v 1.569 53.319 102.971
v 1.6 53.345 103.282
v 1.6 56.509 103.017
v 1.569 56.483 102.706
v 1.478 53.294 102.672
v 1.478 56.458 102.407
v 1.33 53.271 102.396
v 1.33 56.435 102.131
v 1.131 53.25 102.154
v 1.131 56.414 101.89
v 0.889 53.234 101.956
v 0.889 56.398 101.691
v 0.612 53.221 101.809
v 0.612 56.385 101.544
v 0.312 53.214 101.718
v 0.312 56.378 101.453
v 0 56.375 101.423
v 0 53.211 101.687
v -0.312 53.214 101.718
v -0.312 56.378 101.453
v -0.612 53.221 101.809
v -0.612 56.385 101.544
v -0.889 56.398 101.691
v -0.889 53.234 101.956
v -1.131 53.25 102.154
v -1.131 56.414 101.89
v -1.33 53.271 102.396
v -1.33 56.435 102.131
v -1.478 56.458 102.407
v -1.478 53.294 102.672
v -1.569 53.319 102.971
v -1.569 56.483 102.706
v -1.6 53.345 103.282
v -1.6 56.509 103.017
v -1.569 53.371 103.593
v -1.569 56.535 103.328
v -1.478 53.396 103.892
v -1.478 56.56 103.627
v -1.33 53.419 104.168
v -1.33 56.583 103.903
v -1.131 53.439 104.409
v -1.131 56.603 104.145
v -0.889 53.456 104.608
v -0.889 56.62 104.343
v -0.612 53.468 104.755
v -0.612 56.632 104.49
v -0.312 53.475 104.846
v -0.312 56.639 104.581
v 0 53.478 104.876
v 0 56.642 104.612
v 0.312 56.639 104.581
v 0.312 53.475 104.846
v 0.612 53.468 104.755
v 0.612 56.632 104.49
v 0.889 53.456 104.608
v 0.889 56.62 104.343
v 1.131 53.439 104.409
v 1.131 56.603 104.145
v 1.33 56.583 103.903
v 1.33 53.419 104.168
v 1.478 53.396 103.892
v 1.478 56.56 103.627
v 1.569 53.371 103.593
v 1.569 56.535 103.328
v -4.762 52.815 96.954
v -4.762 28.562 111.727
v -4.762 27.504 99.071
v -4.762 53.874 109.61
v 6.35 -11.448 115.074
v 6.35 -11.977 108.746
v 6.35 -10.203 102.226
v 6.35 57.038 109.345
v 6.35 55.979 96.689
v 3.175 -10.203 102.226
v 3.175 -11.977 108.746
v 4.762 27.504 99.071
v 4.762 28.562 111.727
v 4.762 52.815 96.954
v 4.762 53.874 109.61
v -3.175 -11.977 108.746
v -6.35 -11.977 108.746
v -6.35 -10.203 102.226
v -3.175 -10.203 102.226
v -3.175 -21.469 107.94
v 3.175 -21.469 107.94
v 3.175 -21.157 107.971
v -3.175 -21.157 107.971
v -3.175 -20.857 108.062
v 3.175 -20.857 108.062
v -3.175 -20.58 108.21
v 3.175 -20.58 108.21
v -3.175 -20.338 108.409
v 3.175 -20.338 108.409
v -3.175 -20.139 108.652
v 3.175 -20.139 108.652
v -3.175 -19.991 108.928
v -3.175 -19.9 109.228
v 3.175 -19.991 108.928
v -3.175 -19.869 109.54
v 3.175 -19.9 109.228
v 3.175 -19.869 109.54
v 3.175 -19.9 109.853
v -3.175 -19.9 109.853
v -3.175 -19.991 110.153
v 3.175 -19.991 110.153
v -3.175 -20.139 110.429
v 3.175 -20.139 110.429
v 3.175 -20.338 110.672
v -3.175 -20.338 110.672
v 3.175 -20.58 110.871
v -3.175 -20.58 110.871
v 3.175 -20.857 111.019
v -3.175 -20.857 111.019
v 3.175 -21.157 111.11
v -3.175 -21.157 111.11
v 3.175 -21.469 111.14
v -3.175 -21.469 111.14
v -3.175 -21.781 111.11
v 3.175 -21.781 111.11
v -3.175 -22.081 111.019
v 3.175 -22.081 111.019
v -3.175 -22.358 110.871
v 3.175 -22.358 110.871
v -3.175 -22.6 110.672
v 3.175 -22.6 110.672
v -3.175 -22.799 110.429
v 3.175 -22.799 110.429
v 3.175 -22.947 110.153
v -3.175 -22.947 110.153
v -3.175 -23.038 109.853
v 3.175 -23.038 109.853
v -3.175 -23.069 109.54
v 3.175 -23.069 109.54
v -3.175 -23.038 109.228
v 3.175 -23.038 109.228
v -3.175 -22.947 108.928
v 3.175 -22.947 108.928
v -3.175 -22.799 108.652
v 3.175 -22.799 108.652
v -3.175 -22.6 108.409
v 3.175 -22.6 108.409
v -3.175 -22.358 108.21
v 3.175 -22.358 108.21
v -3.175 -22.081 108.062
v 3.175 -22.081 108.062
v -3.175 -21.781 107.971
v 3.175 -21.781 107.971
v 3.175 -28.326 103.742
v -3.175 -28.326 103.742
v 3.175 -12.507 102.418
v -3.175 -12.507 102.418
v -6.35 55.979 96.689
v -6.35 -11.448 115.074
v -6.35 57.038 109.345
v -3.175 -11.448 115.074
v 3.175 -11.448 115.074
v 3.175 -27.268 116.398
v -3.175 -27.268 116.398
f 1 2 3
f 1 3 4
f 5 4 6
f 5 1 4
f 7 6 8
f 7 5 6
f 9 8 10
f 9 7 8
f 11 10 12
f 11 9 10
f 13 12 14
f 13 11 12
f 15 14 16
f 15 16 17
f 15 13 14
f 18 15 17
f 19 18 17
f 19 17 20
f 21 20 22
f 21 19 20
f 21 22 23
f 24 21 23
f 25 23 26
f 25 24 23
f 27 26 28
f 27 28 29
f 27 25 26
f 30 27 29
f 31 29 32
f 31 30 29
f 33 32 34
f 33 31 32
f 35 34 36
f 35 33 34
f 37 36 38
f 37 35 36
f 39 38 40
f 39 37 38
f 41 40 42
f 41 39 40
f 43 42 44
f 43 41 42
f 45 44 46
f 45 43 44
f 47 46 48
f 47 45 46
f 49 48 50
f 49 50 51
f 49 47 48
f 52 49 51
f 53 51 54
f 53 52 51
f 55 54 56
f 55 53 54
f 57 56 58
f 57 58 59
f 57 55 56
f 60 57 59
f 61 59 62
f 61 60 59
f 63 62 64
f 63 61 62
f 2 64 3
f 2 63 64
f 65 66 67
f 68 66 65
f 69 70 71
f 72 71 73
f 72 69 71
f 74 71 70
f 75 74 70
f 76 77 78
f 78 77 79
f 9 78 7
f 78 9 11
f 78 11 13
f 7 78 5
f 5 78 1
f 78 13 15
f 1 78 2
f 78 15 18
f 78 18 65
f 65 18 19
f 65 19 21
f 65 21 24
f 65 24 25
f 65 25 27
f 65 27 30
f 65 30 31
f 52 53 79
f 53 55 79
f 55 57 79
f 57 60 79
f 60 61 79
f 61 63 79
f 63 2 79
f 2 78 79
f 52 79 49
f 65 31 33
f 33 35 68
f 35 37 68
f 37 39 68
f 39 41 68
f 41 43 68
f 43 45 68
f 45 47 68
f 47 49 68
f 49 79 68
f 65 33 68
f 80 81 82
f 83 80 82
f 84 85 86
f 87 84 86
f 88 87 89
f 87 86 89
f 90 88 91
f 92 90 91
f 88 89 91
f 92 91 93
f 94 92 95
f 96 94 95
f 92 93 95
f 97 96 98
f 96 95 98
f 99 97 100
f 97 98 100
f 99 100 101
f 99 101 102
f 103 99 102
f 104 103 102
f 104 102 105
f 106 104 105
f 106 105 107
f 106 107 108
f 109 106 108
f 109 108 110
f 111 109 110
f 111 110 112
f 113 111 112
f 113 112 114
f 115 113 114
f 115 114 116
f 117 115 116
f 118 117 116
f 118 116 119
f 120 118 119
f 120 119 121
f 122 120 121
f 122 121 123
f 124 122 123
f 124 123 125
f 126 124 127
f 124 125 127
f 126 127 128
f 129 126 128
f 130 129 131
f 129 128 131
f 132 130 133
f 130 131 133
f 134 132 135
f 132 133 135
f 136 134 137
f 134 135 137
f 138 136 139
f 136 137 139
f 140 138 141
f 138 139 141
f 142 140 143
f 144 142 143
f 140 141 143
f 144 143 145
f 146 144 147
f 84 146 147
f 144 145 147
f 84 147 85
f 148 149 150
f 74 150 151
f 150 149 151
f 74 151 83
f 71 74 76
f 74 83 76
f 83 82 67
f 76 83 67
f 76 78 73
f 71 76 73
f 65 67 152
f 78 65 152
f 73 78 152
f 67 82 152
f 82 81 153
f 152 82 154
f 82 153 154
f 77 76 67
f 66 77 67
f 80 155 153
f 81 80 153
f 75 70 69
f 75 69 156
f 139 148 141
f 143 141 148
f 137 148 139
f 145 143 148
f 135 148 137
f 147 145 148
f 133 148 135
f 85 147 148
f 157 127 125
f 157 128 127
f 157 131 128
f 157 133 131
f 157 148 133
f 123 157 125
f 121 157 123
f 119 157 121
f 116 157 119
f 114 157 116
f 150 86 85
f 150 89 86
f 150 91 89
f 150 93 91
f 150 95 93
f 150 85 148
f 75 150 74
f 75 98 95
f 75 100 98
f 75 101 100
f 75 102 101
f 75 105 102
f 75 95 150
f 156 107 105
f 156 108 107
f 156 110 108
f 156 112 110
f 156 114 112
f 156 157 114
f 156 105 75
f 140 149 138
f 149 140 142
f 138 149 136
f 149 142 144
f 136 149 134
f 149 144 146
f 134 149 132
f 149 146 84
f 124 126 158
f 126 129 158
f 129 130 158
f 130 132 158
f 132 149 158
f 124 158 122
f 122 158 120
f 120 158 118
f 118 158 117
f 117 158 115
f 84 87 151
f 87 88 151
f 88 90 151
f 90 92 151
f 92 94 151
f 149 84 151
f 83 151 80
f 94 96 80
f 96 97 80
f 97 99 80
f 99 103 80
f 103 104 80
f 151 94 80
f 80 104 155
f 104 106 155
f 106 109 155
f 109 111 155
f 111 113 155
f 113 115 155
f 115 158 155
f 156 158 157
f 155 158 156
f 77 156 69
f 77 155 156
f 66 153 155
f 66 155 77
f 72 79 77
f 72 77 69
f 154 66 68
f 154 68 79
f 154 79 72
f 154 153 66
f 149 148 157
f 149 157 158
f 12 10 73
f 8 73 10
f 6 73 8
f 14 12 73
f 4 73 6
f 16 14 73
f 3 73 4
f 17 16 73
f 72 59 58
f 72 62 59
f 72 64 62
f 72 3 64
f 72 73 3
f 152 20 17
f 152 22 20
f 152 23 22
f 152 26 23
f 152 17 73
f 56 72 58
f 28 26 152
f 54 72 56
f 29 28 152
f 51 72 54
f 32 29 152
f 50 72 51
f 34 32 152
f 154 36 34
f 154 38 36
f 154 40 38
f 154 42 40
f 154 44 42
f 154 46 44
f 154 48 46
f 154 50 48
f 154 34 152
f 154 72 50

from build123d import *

# Parameters (mm, degrees)
BOSS_EXTRUDE7_START                  = 3.81
SKETCH31_W                           = 68.725
SKETCH31_H                           = 12.7
SKETCH31_W_2                         = 25.4
SKETCH31_H_2                         = 9.525
SKETCH31_W_3                         = 15.875
SKETCH31_H_3                         = 6.35
BOSS_EXTRUDE7_DEPTH                  = 12.7
M3_CLEARANCE_HOLE4_D                 = 3.2
CUT_EXTRUDE3_START                   = 6.35
CUT_EXTRUDE3_DEPTH                   = 3.175
CUT_EXTRUDE4_START                   = -6.35
CUT_EXTRUDE4_DEPTH                   = 3.175
BALL_START                           = 44.54897704
BALL_BALANCER_MASTER_MODEL_OUTLINE_R = 1.6
BALL_BALANCER_MASTER_MODEL_DEPTH     = 3.175


# Read off the part's stored shape, not the designer's step: Ball Balancer Master Model
with BuildPart() as part:
    # Sketch31 → Boss-Extrude7 (new body)
    # profile 1 of 2: a face of its own
    with BuildSketch(Plane(origin=(0, 9.162503731, 109.526818173), x_dir=(0, 0.9965191508346533, -0.08336415308621317), z_dir=(0, 0.08336415308621317, 0.9965191508346533)).offset(BOSS_EXTRUDE7_START)):
        with Locations((13.36147704, 0)):
            Rectangle(SKETCH31_W, SKETCH31_H)
        with Locations((31.84897704, 0)):
            Rectangle(SKETCH31_W_2, SKETCH31_H_2, mode=Mode.SUBTRACT)
    # profile 2 of 2: a face of its own
    with BuildSketch(Plane(origin=(0, 9.162503731, 109.526818173), x_dir=(0, 0.9965191508346533, -0.08336415308621317), z_dir=(0, 0.08336415308621317, 0.9965191508346533)).offset(BOSS_EXTRUDE7_START)):
        with Locations((-28.93852296, 0)):
            Rectangle(SKETCH31_W_3, SKETCH31_H_3)
    extrude(amount=-BOSS_EXTRUDE7_DEPTH)

    # M3 Clearance Hole4 (through all)
    with Locations(Plane.ZY.offset(3.175)):
        with Locations((-85.094578454, 48.544265488), (109.540435581, -21.469007696)):
            Hole(M3_CLEARANCE_HOLE4_D / 2)

    # Sketch35 → Cut-Extrude3 (cut)
    with BuildSketch(Plane.ZY.offset(CUT_EXTRUDE3_START)):
        Polygon((108.746392023, -11.977162785), (102.225823269, -10.203359146), (102.418495416, -12.506525157), align=None)
    extrude(amount=-CUT_EXTRUDE3_DEPTH, mode=Mode.SUBTRACT)

    # Sketch36 → Cut-Extrude4 (cut)
    with BuildSketch(Plane.ZY.offset(CUT_EXTRUDE4_START)):
        Polygon((102.225823269, -10.203359146), (108.746392023, -11.977162785), (102.418495416, -12.506525157), align=None)
    extrude(amount=CUT_EXTRUDE4_DEPTH, mode=Mode.SUBTRACT)

    # Ball Balancer Master Model outline → Ball Balancer Master Model (cut)
    with BuildSketch(Plane(origin=(0, 0, 0), x_dir=(1, 0, 0), z_dir=(0, 0.9965191508346533, -0.08336415308621321)).offset(BALL_START)):
        with Locations((0, -107.369396203)):
            Circle(BALL_BALANCER_MASTER_MODEL_OUTLINE_R)
    extrude(amount=BALL_BALANCER_MASTER_MODEL_DEPTH, mode=Mode.SUBTRACT)


solid = part.part
